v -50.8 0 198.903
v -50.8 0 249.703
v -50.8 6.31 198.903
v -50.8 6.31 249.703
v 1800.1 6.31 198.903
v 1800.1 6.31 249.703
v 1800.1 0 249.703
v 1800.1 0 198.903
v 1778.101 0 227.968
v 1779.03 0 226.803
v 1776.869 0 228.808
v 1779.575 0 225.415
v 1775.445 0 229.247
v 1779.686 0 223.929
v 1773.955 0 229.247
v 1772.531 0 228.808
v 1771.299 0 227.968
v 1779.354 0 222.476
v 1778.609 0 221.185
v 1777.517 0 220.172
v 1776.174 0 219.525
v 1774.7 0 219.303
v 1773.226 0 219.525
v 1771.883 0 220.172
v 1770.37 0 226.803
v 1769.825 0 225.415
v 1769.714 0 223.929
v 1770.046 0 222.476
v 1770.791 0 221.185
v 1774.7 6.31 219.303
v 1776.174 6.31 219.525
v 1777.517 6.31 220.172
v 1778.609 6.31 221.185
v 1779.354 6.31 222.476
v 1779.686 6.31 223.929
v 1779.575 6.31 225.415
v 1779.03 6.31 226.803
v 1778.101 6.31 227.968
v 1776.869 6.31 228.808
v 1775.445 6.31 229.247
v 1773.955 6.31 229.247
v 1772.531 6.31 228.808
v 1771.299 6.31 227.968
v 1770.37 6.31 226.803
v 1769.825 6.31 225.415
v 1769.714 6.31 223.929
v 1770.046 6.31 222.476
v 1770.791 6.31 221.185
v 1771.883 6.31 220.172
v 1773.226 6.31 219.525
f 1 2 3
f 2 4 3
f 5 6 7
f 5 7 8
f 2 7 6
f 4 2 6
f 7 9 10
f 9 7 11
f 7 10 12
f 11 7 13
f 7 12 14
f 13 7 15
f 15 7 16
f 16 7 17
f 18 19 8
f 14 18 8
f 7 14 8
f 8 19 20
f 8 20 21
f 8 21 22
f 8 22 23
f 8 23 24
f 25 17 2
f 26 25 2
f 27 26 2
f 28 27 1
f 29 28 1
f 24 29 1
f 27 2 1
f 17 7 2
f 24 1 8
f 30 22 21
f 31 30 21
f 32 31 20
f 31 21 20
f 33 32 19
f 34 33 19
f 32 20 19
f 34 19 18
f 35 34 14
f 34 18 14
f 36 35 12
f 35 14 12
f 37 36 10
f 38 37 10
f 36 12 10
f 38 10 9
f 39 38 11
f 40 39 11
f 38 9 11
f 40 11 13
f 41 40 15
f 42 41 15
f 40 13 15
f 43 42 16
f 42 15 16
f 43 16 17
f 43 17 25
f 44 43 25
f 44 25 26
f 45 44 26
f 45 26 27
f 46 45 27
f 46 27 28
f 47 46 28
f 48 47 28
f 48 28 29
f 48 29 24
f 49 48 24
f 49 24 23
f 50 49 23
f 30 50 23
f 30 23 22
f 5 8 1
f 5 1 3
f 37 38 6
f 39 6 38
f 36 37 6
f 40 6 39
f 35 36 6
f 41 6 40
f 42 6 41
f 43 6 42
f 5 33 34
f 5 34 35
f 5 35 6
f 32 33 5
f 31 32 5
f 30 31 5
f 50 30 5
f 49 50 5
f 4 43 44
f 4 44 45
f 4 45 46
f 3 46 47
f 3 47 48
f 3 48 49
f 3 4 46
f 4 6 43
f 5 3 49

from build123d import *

# Parameters (mm, degrees)
SALIENTE_EXTRUIR1_DEPTH    = 6.31
SALIENTE_EXTRUIR2_DEPTH    = 50.8
SALIENTE_EXTRUIR3_DEPTH    = 50.8
CROQUIS4_W                 = 50.8
CROQUIS4_H                 = 6.31
SALIENTE_EXTRUIR4_DEPTH    = 50.8
CROQUIS7_R                 = 5
CORTAR_EXTRUIR3_DEPTH      = 50
CROQUIS8_R                 = 5
CORTAR_EXTRUIR4_DEPTH      = 24
CROQUIS9_W                 = 50.8
CROQUIS9_H                 = 6.31
SALIENTE_EXTRUIR5_DEPTH    = 6.45
CORTAR_EXTRUIR6_DEPTH      = 108
CORTAR_EXTRUIR7_DEPTH      = 108
CORTAR_EXTRUIR7_DEPTH_BACK = 108
CROQUIS12_W                = 50.8
CROQUIS12_H                = 198.902795


with BuildPart() as part:
    # Croquis1 → Saliente-Extruir1 (new body)
    with BuildSketch(Plane(origin=(0, 0, 0), x_dir=(1, 0, 0), z_dir=(0, 1, 0))):
        Polygon((1742.85, -198.902795), (1742.85, -249.702795), (-50.8, -249.702795), (-50.8, 0), (0, 0), (0, -198.902795), align=None)
    extrude(amount=SALIENTE_EXTRUIR1_DEPTH)

    # Croquis2 → Saliente-Extruir2 (add)
    with BuildSketch(Plane.ZY.offset(50.8)):
        Polygon((0, 6.31), (0, 132.55), (-32.572440357, 197.880208397), (-26.925404535, 200.695716598), (6.31, 134.035807771), (6.31, 6.31), align=None)
    extrude(amount=-SALIENTE_EXTRUIR2_DEPTH)

    # Croquis4 → Saliente-Extruir4 (add)
    with BuildSketch(Plane(origin=(1742.85, 0, 0), x_dir=(0, 0, -1), z_dir=(1, 0, 0))):
        with Locations((-224.302795, 3.155)):
            Rectangle(CROQUIS4_W, CROQUIS4_H)
    extrude(amount=SALIENTE_EXTRUIR4_DEPTH)

    # Croquis7 → Cortar-Extruir3 (cut)
    with BuildSketch(Plane(origin=(0, 0, 0), x_dir=(-1, 0, 0), z_dir=(0, -1, 0))):
        with Locations((-1774.7, -224.302795)):
            Circle(CROQUIS7_R)
    extrude(amount=-CORTAR_EXTRUIR3_DEPTH, mode=Mode.SUBTRACT)


with BuildPart() as body_2:
    # Croquis3 → Saliente-Extruir3 (new body)
    with BuildSketch(Plane.ZY.offset(50.8)):
        Polygon((6.41, 6.41), (6.41, 134.059354646), (-26.835911099, 200.740336379), (-21.188875277, 203.55584458), (12.72, 135.545162417), (12.72, 6.41), align=None)
    extrude(amount=-SALIENTE_EXTRUIR3_DEPTH)


with BuildPart() as cortar_extruir4_tool:
    # Croquis8 → Cortar-Extruir4 (new body)
    with BuildSketch(Plane.XY.offset(12.72)):
        with Locations((-38.1, 98.1)):
            Circle(CROQUIS8_R)
        with Locations((-12.7, 36.91)):
            Circle(CROQUIS8_R)
    extrude(amount=-CORTAR_EXTRUIR4_DEPTH)


with BuildPart() as part_1:
    add(part.part)

    # Cortar-Extruir4: cut by cortar_extruir4_tool
    add(cortar_extruir4_tool.part, mode=Mode.SUBTRACT)

    # Croquis9 → Saliente-Extruir5 (add)
    with BuildSketch(Plane(origin=(1793.65, 0, 0), x_dir=(0, 0, -1), z_dir=(1, 0, 0))):
        with Locations((-224.302795, 3.155)):
            Rectangle(CROQUIS9_W, CROQUIS9_H)
    extrude(amount=SALIENTE_EXTRUIR5_DEPTH)


with BuildPart() as body_2_1:
    add(body_2.part)

    # Cortar-Extruir4: cut by cortar_extruir4_tool
    add(cortar_extruir4_tool.part, mode=Mode.SUBTRACT)


with BuildPart() as cortar_extruir6_tool:
    # Croquis11 → Cortar-Extruir6 (new body)
    with BuildSketch(Plane.XY.offset(12.72)):
        Polygon((-50.8, 6.41), (0, 6.31), (0, 211.944922599), (-50.8, 211.944922599), align=None)
    extrude(amount=-CORTAR_EXTRUIR6_DEPTH)


with BuildPart() as part_2:
    add(part_1.part)

    # Cortar-Extruir6: cut by cortar_extruir6_tool
    add(cortar_extruir6_tool.part, mode=Mode.SUBTRACT)

    # Croquis12 → Cortar-Extruir7 (cut, two sides: drawn at the far end of the back side and taken through both)
    with BuildSketch(Plane(origin=(0, 6.31, 0), x_dir=(1, 0, 0), z_dir=(0, 1, 0)).offset(-CORTAR_EXTRUIR7_DEPTH_BACK)):
        with Locations((-25.4, -99.4513975)):
            Rectangle(CROQUIS12_W, CROQUIS12_H)
    extrude(amount=CORTAR_EXTRUIR7_DEPTH + CORTAR_EXTRUIR7_DEPTH_BACK, mode=Mode.SUBTRACT)


with BuildPart() as body_2_2:
    add(body_2_1.part)

    # Cortar-Extruir6: cut by cortar_extruir6_tool
    add(cortar_extruir6_tool.part, mode=Mode.SUBTRACT)


solid = part_2.part
